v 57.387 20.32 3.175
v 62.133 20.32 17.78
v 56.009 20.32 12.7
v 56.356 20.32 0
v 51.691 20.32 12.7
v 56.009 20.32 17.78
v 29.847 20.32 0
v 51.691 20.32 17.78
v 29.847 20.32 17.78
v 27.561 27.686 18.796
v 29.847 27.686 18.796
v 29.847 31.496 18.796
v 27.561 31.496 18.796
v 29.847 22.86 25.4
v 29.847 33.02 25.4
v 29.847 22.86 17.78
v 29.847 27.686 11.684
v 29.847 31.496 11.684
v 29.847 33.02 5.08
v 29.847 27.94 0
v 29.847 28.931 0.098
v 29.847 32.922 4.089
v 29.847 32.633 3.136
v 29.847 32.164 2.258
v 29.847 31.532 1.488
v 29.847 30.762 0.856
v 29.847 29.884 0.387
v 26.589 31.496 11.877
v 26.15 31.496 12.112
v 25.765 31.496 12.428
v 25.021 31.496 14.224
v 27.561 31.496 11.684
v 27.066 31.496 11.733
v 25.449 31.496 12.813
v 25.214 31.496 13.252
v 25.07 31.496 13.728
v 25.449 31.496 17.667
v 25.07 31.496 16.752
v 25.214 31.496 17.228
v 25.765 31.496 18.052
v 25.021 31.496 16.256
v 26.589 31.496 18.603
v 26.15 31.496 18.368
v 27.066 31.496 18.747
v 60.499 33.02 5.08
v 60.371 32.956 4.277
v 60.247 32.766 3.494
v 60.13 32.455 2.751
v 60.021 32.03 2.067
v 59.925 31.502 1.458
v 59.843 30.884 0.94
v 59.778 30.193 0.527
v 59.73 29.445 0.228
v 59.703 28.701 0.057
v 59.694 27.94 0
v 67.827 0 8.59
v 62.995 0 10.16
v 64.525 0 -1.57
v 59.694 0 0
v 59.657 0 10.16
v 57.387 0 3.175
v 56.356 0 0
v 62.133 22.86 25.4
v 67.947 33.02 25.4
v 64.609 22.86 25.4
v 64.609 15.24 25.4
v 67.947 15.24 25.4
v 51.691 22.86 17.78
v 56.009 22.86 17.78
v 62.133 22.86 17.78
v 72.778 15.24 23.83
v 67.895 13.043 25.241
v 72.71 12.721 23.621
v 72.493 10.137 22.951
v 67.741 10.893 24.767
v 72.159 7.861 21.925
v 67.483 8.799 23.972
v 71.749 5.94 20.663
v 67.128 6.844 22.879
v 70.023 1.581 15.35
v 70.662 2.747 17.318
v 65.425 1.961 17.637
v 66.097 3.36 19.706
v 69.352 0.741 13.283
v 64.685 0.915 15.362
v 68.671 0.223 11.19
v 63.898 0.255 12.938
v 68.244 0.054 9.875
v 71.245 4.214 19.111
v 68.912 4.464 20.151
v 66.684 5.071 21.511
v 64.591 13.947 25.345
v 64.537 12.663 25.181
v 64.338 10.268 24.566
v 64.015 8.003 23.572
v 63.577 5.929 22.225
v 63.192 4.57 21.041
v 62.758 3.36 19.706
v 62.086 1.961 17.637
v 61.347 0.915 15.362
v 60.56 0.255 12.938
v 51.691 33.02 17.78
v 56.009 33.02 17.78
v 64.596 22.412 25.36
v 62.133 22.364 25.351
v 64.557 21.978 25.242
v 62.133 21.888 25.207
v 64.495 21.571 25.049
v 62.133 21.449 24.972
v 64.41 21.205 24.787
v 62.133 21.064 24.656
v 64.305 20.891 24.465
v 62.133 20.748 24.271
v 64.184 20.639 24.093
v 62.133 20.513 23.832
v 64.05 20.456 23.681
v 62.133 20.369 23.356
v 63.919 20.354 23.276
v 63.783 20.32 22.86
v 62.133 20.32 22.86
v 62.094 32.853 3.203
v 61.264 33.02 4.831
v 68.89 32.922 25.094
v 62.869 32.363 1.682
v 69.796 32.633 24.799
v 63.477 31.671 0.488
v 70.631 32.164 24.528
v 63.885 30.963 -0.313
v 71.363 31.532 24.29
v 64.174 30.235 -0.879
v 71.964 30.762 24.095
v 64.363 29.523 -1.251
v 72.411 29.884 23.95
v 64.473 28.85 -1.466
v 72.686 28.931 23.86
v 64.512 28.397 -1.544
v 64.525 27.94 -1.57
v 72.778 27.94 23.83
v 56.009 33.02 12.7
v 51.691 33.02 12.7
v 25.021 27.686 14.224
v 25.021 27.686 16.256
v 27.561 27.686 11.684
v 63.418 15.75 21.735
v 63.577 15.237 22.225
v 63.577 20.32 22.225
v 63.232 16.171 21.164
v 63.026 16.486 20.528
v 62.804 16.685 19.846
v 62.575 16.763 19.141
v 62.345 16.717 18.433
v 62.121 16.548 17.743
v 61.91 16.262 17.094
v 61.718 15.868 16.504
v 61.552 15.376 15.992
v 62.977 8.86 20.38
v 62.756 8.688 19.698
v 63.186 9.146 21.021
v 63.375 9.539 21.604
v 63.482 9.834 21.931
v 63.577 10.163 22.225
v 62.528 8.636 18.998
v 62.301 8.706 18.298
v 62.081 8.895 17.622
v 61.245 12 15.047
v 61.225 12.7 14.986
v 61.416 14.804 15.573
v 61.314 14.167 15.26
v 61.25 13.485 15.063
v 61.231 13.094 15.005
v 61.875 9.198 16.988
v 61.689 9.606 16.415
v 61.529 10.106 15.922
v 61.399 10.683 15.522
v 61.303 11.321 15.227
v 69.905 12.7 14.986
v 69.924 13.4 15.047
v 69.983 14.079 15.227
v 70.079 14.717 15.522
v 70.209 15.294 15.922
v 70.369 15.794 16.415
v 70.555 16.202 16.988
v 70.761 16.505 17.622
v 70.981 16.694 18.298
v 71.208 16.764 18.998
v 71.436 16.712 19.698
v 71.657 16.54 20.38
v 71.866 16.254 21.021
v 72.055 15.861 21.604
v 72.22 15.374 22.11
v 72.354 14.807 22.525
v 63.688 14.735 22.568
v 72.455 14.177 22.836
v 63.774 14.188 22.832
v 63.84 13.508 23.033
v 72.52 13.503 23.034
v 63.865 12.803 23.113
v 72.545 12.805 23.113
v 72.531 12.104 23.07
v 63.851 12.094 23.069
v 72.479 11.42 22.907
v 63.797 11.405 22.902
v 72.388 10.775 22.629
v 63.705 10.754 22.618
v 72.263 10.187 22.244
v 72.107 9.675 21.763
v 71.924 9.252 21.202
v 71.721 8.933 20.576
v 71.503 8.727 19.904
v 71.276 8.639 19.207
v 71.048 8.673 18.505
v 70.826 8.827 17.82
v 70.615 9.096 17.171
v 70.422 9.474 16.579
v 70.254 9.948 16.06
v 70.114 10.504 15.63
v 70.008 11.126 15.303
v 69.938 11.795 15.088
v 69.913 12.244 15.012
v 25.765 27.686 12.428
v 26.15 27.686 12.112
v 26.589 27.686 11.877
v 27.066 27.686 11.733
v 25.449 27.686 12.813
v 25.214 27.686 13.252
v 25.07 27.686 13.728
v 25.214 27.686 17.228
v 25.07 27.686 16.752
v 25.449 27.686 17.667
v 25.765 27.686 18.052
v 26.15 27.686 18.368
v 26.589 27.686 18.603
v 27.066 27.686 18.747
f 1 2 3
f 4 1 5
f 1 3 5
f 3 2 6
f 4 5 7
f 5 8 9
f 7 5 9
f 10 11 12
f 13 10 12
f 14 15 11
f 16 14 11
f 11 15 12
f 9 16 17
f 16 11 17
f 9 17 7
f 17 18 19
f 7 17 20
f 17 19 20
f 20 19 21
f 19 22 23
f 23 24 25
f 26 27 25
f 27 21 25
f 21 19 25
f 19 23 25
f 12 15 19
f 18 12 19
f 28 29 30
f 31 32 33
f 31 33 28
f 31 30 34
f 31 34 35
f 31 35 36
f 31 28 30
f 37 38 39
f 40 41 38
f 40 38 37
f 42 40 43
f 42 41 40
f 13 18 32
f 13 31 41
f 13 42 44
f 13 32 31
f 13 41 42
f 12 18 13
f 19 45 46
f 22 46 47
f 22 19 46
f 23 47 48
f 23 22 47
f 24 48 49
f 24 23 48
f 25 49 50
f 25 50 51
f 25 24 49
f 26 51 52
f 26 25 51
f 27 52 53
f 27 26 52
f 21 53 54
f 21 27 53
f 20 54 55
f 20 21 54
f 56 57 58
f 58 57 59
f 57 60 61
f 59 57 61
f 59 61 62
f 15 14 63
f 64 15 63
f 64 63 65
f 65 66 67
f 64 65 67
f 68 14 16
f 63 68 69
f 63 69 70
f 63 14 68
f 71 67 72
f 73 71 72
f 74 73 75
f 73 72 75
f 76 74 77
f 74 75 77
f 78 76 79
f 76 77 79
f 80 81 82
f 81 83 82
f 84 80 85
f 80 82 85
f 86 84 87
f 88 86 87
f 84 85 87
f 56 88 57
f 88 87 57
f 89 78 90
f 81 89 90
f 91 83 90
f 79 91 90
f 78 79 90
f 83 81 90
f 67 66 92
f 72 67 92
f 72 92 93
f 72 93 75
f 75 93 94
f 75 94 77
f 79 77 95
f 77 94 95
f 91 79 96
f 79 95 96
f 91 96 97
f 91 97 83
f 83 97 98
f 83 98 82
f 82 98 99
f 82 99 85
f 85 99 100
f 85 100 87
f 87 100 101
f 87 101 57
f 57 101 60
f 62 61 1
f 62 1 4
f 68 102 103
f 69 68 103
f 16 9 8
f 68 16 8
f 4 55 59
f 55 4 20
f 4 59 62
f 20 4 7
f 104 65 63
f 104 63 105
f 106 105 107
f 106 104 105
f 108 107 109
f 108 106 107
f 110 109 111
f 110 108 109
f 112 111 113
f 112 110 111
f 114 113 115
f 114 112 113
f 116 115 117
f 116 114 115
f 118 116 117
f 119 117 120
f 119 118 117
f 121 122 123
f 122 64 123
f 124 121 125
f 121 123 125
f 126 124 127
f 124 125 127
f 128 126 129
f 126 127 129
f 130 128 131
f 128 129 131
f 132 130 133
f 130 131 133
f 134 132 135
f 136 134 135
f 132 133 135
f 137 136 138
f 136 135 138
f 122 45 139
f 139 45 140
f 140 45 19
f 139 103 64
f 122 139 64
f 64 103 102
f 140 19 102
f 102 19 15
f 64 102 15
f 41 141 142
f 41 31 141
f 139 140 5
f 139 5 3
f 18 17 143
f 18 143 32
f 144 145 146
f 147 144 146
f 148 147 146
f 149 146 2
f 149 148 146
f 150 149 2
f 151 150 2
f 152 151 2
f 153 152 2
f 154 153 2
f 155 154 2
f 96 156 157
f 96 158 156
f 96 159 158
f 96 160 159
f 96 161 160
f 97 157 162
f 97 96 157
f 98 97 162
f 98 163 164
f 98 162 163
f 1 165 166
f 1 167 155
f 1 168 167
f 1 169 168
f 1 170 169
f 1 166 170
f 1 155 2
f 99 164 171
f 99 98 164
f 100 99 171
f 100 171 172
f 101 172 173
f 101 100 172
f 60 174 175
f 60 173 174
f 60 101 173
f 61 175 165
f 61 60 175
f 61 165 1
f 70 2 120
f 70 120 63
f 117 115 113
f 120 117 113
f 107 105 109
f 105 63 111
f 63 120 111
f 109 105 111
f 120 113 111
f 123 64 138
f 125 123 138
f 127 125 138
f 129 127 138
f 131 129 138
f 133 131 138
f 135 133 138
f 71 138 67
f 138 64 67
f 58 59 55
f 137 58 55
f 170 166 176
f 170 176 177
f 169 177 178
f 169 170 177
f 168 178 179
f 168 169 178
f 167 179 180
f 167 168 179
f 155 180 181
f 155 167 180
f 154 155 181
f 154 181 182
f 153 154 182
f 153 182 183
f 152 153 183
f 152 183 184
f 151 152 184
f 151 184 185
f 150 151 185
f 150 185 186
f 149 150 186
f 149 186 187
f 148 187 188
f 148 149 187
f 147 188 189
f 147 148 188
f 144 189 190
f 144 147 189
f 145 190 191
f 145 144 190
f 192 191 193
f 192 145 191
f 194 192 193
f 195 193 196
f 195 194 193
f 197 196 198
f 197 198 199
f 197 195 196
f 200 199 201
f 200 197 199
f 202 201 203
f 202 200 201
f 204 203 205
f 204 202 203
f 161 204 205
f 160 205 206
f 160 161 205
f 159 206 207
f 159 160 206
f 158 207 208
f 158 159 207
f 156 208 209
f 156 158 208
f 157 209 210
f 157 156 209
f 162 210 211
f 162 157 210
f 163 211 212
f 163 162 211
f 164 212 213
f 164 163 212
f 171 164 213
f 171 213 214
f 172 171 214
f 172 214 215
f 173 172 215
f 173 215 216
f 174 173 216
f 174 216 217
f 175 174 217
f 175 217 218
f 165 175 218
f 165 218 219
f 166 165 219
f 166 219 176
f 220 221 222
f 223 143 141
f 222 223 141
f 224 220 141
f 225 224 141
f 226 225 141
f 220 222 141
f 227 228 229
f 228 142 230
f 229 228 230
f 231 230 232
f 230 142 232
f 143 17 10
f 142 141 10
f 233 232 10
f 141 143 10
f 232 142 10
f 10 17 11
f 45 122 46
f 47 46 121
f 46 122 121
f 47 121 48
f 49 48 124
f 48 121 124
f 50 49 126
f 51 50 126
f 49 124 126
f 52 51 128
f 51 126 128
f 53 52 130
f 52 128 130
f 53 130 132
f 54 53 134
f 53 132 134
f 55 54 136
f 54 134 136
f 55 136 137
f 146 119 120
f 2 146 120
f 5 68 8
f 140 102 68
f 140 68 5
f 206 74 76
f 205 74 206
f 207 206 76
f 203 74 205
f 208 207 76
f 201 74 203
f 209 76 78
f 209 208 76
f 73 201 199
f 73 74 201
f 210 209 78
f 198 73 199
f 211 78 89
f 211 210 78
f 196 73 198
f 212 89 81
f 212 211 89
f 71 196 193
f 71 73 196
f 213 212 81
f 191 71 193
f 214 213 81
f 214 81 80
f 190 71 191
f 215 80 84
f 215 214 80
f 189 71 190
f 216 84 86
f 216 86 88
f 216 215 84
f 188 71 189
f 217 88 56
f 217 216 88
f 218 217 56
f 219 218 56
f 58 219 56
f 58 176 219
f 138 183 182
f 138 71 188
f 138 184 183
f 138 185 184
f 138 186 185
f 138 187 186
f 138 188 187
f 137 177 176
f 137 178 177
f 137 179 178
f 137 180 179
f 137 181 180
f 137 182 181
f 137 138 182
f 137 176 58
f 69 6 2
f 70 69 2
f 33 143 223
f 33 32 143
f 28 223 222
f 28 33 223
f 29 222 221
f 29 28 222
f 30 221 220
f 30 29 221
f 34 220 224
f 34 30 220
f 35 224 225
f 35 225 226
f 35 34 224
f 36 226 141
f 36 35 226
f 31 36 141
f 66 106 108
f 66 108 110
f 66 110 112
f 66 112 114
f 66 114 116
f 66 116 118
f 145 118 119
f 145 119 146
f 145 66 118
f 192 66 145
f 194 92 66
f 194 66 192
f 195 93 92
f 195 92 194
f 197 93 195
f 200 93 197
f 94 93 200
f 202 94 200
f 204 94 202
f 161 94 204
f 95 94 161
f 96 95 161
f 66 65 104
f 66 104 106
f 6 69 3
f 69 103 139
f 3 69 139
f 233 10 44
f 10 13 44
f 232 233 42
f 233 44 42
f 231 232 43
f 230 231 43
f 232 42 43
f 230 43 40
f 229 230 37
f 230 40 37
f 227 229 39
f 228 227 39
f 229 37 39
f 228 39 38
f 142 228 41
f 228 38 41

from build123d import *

# Parameters (mm, degrees)
BOSS_EXTRUDE1_DEPTH     = 33.02
CUT_EXTRUDE1_DEPTH      = 20.32
FILLET1_R               = 15.24
SKETCH4_W               = 4.318
SKETCH4_H               = 5.08
CUT_EXTRUDE3_DEPTH      = 20.32
FILLET2_R               = 2.54
BOSS_EXTRUDE2_DEPTH     = 5.08
BOSS_EXTRUDE3_DEPTH     = 5.08
CUT_EXTRUDE2_DEPTH      = 88.392
CUT_EXTRUDE2_DEPTH_BACK = 20.32
SKETCH3_R               = 4.064
FILLET3_R               = 5.08
SKETCH7_W               = 44.236060242
SKETCH7_H               = 34.660368577
CUT_EXTRUDE4_DEPTH      = 37.084
SKETCH8_W               = 7.112
SKETCH8_H               = 3.81
BOSS_EXTRUDE4_DEPTH     = 4.826
FILLET4_R               = 2.54
SKETCH9_W               = 32.557227401
SKETCH9_H               = 7.62
CUT_EXTRUDE5_DEPTH      = 2.54


with BuildPart() as part:
    # Sketch1 → Boss-Extrude1 (new body)
    with BuildSketch(Plane(origin=(0, 0, 0), x_dir=(1, 0, 0), z_dir=(0, 1, 0))):
        Polygon((0, 0), (-8.252960284, -25.4), (67.947039716, -25.4), (59.694079431, 0), align=None)
    extrude(amount=BOSS_EXTRUDE1_DEPTH)

    # Sketch2 → Cut-Extrude1 (cut)
    with BuildSketch(Plane.XZ):
        Polygon((-3.882947687, 22.225), (-6.015103815, 28.787101815), (66.521112465, 31.285963003), (63.577027118, 22.225), (57.387306905, 3.175), (55.156358593, -3.691152891), (4.897822181, -4.799430866), (2.306772526, 3.175), align=None)
    extrude(amount=-CUT_EXTRUDE1_DEPTH, mode=Mode.SUBTRACT)

    # Fillet1
    # the kernel refuses this fillet: 15.24 mm, written as the material it takes off along each edge
    with BuildSketch(Plane(origin=(26.508647154, 0, 25.4), x_dir=(0, 1, 0), z_dir=(1, 0, 0)), Plane(origin=(-46.352960284, 0, 25.4), x_dir=(0, 1, 0), z_dir=(1, 0, 0))) as fillet1_piece_1:
        with BuildLine():
            CenterArc((FILLET1_R, -FILLET1_R), FILLET1_R, 90, 90)
            Line((0, -FILLET1_R), (0, 0))
            Line((0, 0), (FILLET1_R, 0))
        make_face()
    extrude(amount=79.538392562, mode=Mode.SUBTRACT)

    # Sketch4 → Cut-Extrude3 (cut)
    with BuildSketch(Plane(origin=(0, 33.02, 0), x_dir=(1, 0, 0), z_dir=(0, 1, 0))):
        with Locations((53.850039716, -15.24)):
            Rectangle(SKETCH4_W, SKETCH4_H)
        with Locations((5.844039716, -15.24)):
            Rectangle(SKETCH4_W, SKETCH4_H)
    extrude(amount=-CUT_EXTRUDE3_DEPTH, mode=Mode.SUBTRACT)

    # Fillet2
    fillet2_edges = [part.edges().sort_by_distance(p)[0] for p in [
        (29.847039716, 20.32, 25.4),
    ]]
    fillet(fillet2_edges, radius=FILLET2_R)

    # Sketch5 → Boss-Extrude2 (add)
    with BuildSketch(Plane(origin=(0, 0, 0), x_dir=(-0.3090169943749446, 0, 0.9510565162951545), z_dir=(-0.9510565162951545, 0, -0.3090169943749446))):
        with BuildLine():
            Line((0, 0), (10.682856198, 0))
            add(Edge.make_bspline(
                [(10.682856198, 0), (26.707140496, 0), (26.707140496, 15.24)],
                knots=[1.570796327, 1.570796327, 1.570796327, 3.141592654, 3.141592654, 3.141592654], degree=2, weights=[1, 0.707106781, 1]))
            Line((26.707140496, 15.24), (26.707140496, 33.02))
            Line((26.707140496, 33.02), (0, 33.02))
            Line((0, 33.02), (0, 0))
        make_face()
    extrude(amount=BOSS_EXTRUDE2_DEPTH)

    # Sketch6 → Boss-Extrude3 (add)
    with BuildSketch(Plane(origin=(53.993802077, 0, -17.543649769), x_dir=(-0.30901699437494445, 0, -0.9510565162951545), z_dir=(0.9510565162951545, 0, -0.30901699437494445))):
        with BuildLine():
            Line((-45.153625504, 33.02), (-45.153625504, 15.24))
            add(Edge.make_bspline(
                [(-45.153625504, 15.24), (-45.153625504, 0), (-29.129341206, 0)],
                knots=[0, 0, 0, 1.570796327, 1.570796327, 1.570796327], degree=2, weights=[1, 0.707106781, 1]))
            Line((-29.129341206, 0), (-18.446485008, 0))
            Line((-18.446485008, 0), (-18.446485008, 33.02))
            Line((-18.446485008, 33.02), (-45.153625504, 33.02))
        make_face()
    extrude(amount=BOSS_EXTRUDE3_DEPTH)

    # Sketch3 → Cut-Extrude2 (cut, two sides: drawn at the far end of the back side and taken through both)
    with BuildSketch(Plane(origin=(0, 0, 0), x_dir=(0, 0, -1), z_dir=(1, 0, 0)).offset(-CUT_EXTRUDE2_DEPTH_BACK)):
        with Locations((-19.05, 12.7)):
            Circle(SKETCH3_R)
    extrude(amount=CUT_EXTRUDE2_DEPTH + CUT_EXTRUDE2_DEPTH_BACK, mode=Mode.SUBTRACT)

    # Fillet3
    fillet3_edges = [part.edges().sort_by_distance(p)[0] for p in [
        (-2.415683551, 33.02, -0.784903166),
        (62.109762983, 33.02, -0.784903166),
        (29.847039716, 33.02, 0),
        (-8.957847245, 33.02, 11.130193669),
        (68.651926676, 33.02, 11.130193669),
    ]]
    fillet(fillet3_edges, radius=FILLET3_R)

    # Sketch7 → Cut-Extrude4 (cut)
    with BuildSketch(Plane(origin=(0, 33.02, 0), x_dir=(1, 0, 0), z_dir=(0, 1, 0))):
        with Locations((7.729009595, -8.069815712)):
            Rectangle(SKETCH7_W, SKETCH7_H)
    extrude(amount=-CUT_EXTRUDE4_DEPTH, mode=Mode.SUBTRACT)

    # Sketch8 → Boss-Extrude4 (add)
    with BuildSketch(Plane.ZY.offset(-29.847039716)):
        with Locations((15.24, 29.591)):
            Rectangle(SKETCH8_W, SKETCH8_H)
    extrude(amount=BOSS_EXTRUDE4_DEPTH)

    # Fillet4
    fillet4_edges = [part.edges().sort_by_distance(p)[0] for p in [
        (25.021039716, 29.591, 18.796),
        (25.021039716, 29.591, 11.684),
    ]]
    fillet(fillet4_edges, radius=FILLET4_R)

    # Sketch9 → Cut-Extrude5 (cut)
    with BuildSketch(Plane.XZ.offset(-20.32)):
        with Locations((45.854145368, 21.59)):
            Rectangle(SKETCH9_W, SKETCH9_H)
    extrude(amount=-CUT_EXTRUDE5_DEPTH, mode=Mode.SUBTRACT)


solid = part.part
